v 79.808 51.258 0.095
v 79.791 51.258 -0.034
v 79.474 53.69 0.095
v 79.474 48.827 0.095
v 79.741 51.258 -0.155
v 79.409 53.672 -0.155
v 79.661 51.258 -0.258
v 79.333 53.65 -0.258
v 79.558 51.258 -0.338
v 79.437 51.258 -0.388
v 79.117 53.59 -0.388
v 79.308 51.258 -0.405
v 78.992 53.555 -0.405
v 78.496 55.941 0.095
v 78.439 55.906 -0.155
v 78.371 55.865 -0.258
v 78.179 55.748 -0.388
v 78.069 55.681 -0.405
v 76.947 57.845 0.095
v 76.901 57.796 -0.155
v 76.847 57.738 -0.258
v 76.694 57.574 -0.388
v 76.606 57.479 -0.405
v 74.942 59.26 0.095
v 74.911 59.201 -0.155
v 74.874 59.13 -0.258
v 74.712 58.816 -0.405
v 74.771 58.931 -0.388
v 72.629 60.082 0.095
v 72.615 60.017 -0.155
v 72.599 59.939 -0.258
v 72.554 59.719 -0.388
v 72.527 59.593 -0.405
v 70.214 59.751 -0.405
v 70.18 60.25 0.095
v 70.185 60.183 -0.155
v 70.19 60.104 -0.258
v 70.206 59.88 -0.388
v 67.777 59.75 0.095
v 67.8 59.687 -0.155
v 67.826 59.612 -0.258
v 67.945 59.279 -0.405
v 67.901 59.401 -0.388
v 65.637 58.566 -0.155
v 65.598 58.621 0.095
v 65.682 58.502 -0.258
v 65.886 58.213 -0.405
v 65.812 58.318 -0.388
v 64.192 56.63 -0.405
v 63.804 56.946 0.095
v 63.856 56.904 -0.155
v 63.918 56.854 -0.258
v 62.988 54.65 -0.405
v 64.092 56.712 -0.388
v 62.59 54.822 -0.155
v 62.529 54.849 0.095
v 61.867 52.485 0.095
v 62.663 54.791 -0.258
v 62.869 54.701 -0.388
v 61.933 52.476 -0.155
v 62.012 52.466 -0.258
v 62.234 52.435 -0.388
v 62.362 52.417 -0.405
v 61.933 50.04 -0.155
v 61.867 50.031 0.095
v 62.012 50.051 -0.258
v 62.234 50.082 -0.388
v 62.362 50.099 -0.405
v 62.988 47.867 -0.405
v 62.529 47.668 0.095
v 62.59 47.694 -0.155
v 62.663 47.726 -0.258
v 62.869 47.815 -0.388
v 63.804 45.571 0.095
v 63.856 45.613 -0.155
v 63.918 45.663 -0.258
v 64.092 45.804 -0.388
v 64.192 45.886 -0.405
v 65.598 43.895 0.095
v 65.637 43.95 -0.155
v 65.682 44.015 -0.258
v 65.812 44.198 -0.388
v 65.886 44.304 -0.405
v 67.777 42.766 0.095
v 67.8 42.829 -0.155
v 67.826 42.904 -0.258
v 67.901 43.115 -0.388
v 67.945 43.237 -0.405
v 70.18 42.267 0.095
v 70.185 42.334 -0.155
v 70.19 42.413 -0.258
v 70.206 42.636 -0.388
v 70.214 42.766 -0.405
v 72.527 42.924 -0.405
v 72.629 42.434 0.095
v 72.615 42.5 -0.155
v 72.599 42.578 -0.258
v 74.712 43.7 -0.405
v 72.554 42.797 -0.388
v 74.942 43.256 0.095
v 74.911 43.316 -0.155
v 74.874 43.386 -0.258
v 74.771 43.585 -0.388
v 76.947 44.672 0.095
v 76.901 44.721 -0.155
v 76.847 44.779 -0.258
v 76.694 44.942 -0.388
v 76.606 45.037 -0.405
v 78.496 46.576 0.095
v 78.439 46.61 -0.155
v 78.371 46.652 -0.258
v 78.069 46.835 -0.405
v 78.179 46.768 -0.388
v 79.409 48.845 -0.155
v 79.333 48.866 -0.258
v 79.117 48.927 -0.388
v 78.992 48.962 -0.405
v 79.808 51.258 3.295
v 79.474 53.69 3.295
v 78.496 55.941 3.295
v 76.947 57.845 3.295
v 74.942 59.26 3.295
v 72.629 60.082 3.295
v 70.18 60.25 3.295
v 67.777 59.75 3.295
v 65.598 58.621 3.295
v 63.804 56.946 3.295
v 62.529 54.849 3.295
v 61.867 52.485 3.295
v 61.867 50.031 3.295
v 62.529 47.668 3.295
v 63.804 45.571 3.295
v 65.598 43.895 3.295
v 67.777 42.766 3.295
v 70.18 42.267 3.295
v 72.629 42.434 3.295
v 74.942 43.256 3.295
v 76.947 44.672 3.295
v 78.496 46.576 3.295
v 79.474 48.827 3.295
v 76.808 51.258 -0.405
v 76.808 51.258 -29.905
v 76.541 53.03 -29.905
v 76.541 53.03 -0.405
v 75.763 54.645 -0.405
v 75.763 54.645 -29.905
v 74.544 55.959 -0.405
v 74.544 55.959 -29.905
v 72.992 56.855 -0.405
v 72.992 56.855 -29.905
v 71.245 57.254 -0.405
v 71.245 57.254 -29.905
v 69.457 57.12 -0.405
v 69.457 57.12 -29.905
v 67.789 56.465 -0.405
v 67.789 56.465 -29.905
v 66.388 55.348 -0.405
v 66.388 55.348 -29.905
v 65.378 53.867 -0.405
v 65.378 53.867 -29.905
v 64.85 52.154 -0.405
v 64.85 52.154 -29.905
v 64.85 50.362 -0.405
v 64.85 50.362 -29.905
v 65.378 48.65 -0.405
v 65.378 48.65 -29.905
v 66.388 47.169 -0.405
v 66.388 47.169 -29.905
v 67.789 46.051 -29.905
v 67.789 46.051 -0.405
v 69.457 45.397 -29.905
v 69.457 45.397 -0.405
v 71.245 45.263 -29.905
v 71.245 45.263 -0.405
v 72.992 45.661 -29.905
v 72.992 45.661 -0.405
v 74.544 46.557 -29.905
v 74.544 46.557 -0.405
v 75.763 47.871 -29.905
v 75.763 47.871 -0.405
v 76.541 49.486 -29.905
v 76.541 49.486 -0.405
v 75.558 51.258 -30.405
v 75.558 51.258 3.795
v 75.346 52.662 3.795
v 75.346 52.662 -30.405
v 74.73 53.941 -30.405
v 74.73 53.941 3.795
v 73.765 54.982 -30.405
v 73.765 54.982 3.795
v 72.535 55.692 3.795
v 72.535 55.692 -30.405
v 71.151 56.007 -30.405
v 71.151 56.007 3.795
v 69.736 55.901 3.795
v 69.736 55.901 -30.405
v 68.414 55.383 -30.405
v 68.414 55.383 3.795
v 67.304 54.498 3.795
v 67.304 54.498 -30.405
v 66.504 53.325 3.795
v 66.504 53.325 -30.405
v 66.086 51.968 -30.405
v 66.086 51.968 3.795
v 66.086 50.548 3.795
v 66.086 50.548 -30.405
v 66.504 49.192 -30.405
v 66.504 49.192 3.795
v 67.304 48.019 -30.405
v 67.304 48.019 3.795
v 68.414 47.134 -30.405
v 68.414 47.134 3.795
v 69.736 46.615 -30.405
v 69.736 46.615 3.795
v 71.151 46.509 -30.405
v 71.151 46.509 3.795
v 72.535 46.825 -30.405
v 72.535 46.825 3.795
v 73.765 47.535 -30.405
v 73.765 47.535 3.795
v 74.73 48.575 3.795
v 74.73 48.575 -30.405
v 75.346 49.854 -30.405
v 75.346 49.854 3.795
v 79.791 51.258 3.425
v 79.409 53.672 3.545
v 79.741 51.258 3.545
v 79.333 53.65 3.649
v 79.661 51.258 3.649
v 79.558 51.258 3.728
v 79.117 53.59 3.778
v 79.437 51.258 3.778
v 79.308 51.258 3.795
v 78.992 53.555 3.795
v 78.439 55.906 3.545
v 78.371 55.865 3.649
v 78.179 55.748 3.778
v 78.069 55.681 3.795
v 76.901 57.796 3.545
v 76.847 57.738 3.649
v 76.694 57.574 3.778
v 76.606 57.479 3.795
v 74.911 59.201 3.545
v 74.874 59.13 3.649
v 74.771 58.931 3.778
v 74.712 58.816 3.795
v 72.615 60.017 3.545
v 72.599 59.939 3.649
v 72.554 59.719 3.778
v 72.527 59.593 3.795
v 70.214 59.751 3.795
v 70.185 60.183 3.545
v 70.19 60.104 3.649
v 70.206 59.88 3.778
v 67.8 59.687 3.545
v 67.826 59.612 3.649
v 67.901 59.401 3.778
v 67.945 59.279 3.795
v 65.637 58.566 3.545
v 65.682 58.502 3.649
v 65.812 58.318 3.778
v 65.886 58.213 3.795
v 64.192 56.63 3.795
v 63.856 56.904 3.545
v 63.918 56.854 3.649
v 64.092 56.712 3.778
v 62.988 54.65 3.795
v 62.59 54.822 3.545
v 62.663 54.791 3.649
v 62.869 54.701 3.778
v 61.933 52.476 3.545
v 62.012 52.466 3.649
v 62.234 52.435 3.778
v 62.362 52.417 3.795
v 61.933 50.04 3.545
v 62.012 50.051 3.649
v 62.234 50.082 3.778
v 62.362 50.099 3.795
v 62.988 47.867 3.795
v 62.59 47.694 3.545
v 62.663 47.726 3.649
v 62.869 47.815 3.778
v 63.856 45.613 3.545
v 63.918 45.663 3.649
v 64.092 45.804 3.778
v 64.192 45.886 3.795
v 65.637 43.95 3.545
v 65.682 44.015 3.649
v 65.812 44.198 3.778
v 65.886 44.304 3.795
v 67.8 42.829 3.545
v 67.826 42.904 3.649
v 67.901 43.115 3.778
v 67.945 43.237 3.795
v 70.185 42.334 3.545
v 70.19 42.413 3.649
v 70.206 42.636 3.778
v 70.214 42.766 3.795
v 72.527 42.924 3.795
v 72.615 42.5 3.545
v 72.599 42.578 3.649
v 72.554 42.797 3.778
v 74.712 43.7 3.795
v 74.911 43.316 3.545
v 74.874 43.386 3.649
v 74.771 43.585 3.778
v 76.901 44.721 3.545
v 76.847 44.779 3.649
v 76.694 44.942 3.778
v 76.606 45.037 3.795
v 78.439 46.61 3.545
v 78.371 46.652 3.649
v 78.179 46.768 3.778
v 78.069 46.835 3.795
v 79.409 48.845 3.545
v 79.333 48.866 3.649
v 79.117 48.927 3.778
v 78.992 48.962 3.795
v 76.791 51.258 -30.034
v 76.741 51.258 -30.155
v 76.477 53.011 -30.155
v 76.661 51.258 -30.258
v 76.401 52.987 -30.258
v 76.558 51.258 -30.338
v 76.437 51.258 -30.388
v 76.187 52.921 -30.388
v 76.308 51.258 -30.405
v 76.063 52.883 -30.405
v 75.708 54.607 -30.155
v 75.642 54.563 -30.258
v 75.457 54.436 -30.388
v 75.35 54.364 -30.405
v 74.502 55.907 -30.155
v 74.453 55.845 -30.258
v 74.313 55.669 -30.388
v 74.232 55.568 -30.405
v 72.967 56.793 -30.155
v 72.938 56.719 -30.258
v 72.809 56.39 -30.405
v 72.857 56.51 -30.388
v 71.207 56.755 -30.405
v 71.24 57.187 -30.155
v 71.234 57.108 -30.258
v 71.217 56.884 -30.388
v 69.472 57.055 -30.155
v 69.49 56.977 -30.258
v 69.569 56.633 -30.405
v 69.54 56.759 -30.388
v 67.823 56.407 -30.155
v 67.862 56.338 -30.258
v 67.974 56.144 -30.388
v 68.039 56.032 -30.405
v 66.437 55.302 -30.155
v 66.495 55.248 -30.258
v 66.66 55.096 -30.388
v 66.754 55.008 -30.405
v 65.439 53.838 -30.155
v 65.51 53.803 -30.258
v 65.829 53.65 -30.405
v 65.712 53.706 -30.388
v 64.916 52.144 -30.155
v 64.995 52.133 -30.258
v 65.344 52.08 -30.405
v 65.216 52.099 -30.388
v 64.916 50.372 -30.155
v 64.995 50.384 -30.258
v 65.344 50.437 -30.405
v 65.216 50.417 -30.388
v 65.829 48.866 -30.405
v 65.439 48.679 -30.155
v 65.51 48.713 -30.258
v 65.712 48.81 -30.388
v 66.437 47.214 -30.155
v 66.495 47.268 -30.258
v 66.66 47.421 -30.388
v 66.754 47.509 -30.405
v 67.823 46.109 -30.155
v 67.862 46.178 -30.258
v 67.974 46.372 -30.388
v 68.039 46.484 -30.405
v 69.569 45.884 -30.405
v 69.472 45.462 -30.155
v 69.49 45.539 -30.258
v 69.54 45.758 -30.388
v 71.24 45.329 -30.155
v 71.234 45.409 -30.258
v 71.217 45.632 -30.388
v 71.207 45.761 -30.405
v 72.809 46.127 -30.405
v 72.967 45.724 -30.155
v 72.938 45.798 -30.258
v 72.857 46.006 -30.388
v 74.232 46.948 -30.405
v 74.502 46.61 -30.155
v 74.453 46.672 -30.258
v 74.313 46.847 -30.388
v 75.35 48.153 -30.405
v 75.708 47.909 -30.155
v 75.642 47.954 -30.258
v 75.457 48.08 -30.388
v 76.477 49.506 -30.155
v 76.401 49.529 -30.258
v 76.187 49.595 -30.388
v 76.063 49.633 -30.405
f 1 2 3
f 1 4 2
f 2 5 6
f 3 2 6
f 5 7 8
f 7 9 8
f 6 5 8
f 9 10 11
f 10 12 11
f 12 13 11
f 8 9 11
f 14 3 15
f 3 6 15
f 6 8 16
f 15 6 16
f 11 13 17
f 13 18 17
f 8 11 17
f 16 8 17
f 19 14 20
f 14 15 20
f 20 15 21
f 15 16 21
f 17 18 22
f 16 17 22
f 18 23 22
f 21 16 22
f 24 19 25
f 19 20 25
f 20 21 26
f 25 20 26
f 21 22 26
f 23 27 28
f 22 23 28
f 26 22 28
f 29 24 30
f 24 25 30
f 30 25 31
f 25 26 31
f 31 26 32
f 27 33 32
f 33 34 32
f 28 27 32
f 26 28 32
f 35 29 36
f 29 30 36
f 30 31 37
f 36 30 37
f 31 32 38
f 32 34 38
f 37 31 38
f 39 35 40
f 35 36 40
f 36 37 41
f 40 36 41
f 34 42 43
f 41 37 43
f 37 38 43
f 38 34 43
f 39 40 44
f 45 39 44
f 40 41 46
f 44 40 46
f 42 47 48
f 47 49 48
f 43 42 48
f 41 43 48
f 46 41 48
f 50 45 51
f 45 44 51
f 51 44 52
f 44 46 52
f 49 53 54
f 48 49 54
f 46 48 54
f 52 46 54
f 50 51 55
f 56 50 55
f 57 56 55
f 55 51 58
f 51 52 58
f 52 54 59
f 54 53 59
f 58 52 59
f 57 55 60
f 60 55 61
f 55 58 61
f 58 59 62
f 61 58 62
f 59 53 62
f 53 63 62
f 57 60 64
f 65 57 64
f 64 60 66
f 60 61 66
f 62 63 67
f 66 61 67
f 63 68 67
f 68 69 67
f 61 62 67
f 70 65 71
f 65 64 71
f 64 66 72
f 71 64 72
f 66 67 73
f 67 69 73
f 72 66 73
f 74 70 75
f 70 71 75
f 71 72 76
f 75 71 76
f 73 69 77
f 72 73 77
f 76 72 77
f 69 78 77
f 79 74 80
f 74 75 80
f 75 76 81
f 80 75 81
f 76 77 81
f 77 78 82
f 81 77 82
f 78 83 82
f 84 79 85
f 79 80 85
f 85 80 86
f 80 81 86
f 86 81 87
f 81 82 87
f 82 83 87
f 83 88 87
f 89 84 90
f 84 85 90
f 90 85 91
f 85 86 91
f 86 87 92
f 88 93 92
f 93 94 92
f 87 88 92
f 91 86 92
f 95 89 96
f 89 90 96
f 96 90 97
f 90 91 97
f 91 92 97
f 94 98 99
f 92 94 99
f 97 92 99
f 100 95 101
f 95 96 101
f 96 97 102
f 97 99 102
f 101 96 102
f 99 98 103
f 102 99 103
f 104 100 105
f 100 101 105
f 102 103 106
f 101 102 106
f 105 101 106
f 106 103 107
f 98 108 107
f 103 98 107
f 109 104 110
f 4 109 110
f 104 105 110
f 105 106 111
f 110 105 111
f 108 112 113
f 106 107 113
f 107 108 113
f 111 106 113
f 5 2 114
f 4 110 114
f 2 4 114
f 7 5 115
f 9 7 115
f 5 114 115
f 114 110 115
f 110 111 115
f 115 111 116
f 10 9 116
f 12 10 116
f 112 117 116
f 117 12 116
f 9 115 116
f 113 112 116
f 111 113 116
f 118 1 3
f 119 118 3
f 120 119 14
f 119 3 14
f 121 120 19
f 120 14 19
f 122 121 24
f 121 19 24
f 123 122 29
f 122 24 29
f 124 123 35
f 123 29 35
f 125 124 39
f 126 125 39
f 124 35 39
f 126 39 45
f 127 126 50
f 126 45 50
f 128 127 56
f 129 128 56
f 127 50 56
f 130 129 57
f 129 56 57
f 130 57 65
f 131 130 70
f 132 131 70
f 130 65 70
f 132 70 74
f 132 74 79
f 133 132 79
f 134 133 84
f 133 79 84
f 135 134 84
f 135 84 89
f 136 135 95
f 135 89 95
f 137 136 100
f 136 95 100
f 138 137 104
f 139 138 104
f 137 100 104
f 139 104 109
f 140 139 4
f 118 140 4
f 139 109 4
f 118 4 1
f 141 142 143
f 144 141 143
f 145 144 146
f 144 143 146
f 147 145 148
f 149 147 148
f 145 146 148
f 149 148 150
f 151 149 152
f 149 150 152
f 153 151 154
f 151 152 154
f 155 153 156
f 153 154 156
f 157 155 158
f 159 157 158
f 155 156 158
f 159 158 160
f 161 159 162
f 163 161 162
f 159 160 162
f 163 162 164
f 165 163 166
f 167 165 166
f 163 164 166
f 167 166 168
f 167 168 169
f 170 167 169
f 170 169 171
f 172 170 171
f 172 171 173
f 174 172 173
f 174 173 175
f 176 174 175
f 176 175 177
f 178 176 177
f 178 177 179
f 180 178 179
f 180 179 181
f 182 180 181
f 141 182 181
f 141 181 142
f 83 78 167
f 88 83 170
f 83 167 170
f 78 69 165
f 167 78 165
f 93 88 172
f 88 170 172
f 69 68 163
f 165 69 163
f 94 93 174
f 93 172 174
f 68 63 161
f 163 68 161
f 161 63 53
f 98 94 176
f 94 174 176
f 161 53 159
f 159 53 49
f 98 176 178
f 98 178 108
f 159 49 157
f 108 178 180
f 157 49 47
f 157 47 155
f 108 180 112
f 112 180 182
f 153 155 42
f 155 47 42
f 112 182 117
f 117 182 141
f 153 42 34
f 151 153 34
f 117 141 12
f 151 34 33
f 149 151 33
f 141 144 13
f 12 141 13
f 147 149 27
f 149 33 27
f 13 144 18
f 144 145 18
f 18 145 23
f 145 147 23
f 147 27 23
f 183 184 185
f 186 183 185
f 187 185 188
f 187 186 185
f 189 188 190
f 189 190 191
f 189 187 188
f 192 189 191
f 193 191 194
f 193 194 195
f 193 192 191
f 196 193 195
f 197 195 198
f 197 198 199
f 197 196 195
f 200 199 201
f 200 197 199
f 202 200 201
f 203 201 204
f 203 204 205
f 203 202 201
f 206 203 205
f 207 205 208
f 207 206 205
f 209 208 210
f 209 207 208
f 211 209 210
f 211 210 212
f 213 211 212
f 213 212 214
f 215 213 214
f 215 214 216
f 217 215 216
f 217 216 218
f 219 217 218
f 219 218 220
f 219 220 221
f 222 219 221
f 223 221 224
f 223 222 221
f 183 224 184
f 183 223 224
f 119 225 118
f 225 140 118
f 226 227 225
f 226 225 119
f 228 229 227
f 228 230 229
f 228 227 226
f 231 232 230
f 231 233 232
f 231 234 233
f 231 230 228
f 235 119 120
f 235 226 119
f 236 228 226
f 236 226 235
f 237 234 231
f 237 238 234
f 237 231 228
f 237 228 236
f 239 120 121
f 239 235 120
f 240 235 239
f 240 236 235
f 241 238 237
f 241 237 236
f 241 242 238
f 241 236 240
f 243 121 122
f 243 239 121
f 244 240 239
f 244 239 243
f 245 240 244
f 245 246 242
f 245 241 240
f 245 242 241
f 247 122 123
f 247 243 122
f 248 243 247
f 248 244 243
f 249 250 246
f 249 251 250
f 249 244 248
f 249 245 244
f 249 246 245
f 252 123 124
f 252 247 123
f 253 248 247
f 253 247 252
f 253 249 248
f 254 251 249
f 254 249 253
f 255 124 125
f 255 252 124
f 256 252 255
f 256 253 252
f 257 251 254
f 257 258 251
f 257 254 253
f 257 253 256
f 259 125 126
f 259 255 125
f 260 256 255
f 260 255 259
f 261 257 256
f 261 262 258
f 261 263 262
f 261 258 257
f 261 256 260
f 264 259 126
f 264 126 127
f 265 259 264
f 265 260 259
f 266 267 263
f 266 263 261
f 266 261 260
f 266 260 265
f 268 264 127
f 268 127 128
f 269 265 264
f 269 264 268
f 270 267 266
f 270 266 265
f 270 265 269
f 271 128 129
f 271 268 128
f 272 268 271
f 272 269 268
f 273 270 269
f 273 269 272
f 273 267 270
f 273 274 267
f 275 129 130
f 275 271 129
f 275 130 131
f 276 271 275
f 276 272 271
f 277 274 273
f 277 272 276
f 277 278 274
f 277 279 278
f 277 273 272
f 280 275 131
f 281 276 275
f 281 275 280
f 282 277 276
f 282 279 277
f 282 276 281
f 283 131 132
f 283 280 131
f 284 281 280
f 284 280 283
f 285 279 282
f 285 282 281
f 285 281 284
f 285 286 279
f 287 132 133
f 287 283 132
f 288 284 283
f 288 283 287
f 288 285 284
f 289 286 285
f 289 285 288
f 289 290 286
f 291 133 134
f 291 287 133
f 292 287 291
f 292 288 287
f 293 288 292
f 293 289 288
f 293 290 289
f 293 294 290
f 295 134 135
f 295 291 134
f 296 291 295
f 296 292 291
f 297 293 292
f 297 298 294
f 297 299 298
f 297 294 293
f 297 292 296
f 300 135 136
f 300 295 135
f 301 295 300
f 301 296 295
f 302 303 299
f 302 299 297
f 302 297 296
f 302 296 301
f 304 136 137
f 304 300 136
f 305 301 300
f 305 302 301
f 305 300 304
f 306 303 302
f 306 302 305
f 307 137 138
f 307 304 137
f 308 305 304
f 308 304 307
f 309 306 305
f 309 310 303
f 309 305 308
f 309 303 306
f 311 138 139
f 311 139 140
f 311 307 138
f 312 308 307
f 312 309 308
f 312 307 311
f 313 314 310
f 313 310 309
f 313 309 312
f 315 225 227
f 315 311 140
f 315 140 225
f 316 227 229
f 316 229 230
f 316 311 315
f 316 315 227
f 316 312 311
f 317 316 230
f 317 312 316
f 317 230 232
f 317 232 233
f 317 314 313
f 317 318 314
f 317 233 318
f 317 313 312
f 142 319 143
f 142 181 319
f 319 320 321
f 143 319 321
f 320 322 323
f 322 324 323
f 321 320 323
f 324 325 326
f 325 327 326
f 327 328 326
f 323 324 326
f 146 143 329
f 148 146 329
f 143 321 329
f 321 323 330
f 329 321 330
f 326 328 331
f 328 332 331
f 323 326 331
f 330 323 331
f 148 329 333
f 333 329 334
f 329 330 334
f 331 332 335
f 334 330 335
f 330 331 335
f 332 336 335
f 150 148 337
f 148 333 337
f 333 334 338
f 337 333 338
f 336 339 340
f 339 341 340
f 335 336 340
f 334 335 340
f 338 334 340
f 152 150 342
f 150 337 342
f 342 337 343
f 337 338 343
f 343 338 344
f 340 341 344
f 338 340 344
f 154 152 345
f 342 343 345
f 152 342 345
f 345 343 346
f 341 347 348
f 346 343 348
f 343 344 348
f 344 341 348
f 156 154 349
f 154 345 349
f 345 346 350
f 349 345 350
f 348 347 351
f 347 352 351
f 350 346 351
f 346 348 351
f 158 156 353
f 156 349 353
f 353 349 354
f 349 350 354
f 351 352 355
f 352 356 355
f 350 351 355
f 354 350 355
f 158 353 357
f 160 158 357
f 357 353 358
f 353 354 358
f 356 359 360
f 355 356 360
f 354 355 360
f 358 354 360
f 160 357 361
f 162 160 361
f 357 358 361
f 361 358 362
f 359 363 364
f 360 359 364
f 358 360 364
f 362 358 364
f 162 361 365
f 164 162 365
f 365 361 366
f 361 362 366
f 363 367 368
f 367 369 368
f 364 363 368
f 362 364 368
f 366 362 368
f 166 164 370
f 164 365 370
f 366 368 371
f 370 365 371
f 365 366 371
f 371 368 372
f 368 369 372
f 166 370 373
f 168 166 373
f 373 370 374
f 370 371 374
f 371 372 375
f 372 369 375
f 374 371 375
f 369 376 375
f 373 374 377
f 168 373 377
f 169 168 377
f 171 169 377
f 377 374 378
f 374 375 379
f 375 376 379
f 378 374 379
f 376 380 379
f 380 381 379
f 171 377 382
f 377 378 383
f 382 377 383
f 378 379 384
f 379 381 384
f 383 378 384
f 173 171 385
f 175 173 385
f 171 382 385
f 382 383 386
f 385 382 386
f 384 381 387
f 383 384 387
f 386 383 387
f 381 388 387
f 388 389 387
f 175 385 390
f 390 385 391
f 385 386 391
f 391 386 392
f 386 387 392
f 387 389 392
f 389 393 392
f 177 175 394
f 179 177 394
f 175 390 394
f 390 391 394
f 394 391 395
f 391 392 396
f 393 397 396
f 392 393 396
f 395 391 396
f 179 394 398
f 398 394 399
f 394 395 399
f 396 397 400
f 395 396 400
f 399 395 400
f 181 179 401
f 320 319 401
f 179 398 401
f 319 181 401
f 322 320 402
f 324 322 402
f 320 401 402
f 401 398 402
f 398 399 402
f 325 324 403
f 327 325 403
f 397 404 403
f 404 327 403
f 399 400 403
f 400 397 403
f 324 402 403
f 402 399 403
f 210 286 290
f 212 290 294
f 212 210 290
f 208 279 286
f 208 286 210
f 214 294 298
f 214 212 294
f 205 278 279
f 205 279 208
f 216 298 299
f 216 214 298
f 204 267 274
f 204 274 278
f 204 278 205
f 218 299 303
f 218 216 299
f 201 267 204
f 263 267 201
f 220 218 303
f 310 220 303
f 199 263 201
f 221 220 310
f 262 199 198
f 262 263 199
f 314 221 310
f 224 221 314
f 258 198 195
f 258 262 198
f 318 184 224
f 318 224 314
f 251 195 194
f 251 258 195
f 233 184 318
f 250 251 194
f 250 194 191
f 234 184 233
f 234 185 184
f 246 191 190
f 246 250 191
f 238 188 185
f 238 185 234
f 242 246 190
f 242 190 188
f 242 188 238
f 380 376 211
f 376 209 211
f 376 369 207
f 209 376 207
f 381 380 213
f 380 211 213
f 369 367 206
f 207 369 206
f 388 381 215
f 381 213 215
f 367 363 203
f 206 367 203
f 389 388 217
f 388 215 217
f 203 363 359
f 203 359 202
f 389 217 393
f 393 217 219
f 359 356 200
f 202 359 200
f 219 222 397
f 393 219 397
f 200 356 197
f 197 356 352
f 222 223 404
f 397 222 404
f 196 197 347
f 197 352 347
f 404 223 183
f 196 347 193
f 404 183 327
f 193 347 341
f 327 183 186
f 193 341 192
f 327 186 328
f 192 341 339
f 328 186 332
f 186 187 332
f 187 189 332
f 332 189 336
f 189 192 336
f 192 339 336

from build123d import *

# Parameters (mm, degrees)
RESSALTO_EXTRUS_O1_DEPTH      = 4.2
RESSALTO_EXTRUS_O1_DEPTH_BACK = 30
ESBO_O1_R                     = 6.0125
ESBO_O1_R_2                   = 4.7625
ESBO_O2_R                     = 9.0125
ESBO_O2_R_2                   = 6.0125
RESSALTO_EXTRUS_O2_DEPTH      = 4.2
FILETE2_R                     = 0.5


with BuildPart() as part:
    # Esboço1 → Ressalto-extrusão1 (new, two sides: drawn at the far end of the back side and taken through both)
    with BuildSketch(Plane.XY.offset(-0.404551317).offset(-RESSALTO_EXTRUS_O1_DEPTH_BACK)):
        with Locations((70.795334041, 51.25825559)):
            Circle(ESBO_O1_R)
        with Locations((70.795334041, 51.25825559)):
            Circle(ESBO_O1_R_2, mode=Mode.SUBTRACT)
    extrude(amount=RESSALTO_EXTRUS_O1_DEPTH + RESSALTO_EXTRUS_O1_DEPTH_BACK)

    # Esboço2 → Ressalto-extrusão2 (add)
    with BuildSketch(Plane.XY.offset(-0.404551317)):
        with Locations((70.795334041, 51.25825559)):
            Circle(ESBO_O2_R)
        with Locations((70.795334041, 51.25825559)):
            Circle(ESBO_O2_R_2, mode=Mode.SUBTRACT)
    extrude(amount=RESSALTO_EXTRUS_O2_DEPTH)

    # Filete2
    filete2_edges = [part.edges().sort_by_distance(p)[0] for p in [
        (61.782834041, 51.25825559, 3.795448683),
        (61.782834041, 51.25825559, -0.404551317),
        (64.782834041, 51.25825559, -30.404551317),
    ]]
    fillet(filete2_edges, radius=FILETE2_R)


solid = part.part
